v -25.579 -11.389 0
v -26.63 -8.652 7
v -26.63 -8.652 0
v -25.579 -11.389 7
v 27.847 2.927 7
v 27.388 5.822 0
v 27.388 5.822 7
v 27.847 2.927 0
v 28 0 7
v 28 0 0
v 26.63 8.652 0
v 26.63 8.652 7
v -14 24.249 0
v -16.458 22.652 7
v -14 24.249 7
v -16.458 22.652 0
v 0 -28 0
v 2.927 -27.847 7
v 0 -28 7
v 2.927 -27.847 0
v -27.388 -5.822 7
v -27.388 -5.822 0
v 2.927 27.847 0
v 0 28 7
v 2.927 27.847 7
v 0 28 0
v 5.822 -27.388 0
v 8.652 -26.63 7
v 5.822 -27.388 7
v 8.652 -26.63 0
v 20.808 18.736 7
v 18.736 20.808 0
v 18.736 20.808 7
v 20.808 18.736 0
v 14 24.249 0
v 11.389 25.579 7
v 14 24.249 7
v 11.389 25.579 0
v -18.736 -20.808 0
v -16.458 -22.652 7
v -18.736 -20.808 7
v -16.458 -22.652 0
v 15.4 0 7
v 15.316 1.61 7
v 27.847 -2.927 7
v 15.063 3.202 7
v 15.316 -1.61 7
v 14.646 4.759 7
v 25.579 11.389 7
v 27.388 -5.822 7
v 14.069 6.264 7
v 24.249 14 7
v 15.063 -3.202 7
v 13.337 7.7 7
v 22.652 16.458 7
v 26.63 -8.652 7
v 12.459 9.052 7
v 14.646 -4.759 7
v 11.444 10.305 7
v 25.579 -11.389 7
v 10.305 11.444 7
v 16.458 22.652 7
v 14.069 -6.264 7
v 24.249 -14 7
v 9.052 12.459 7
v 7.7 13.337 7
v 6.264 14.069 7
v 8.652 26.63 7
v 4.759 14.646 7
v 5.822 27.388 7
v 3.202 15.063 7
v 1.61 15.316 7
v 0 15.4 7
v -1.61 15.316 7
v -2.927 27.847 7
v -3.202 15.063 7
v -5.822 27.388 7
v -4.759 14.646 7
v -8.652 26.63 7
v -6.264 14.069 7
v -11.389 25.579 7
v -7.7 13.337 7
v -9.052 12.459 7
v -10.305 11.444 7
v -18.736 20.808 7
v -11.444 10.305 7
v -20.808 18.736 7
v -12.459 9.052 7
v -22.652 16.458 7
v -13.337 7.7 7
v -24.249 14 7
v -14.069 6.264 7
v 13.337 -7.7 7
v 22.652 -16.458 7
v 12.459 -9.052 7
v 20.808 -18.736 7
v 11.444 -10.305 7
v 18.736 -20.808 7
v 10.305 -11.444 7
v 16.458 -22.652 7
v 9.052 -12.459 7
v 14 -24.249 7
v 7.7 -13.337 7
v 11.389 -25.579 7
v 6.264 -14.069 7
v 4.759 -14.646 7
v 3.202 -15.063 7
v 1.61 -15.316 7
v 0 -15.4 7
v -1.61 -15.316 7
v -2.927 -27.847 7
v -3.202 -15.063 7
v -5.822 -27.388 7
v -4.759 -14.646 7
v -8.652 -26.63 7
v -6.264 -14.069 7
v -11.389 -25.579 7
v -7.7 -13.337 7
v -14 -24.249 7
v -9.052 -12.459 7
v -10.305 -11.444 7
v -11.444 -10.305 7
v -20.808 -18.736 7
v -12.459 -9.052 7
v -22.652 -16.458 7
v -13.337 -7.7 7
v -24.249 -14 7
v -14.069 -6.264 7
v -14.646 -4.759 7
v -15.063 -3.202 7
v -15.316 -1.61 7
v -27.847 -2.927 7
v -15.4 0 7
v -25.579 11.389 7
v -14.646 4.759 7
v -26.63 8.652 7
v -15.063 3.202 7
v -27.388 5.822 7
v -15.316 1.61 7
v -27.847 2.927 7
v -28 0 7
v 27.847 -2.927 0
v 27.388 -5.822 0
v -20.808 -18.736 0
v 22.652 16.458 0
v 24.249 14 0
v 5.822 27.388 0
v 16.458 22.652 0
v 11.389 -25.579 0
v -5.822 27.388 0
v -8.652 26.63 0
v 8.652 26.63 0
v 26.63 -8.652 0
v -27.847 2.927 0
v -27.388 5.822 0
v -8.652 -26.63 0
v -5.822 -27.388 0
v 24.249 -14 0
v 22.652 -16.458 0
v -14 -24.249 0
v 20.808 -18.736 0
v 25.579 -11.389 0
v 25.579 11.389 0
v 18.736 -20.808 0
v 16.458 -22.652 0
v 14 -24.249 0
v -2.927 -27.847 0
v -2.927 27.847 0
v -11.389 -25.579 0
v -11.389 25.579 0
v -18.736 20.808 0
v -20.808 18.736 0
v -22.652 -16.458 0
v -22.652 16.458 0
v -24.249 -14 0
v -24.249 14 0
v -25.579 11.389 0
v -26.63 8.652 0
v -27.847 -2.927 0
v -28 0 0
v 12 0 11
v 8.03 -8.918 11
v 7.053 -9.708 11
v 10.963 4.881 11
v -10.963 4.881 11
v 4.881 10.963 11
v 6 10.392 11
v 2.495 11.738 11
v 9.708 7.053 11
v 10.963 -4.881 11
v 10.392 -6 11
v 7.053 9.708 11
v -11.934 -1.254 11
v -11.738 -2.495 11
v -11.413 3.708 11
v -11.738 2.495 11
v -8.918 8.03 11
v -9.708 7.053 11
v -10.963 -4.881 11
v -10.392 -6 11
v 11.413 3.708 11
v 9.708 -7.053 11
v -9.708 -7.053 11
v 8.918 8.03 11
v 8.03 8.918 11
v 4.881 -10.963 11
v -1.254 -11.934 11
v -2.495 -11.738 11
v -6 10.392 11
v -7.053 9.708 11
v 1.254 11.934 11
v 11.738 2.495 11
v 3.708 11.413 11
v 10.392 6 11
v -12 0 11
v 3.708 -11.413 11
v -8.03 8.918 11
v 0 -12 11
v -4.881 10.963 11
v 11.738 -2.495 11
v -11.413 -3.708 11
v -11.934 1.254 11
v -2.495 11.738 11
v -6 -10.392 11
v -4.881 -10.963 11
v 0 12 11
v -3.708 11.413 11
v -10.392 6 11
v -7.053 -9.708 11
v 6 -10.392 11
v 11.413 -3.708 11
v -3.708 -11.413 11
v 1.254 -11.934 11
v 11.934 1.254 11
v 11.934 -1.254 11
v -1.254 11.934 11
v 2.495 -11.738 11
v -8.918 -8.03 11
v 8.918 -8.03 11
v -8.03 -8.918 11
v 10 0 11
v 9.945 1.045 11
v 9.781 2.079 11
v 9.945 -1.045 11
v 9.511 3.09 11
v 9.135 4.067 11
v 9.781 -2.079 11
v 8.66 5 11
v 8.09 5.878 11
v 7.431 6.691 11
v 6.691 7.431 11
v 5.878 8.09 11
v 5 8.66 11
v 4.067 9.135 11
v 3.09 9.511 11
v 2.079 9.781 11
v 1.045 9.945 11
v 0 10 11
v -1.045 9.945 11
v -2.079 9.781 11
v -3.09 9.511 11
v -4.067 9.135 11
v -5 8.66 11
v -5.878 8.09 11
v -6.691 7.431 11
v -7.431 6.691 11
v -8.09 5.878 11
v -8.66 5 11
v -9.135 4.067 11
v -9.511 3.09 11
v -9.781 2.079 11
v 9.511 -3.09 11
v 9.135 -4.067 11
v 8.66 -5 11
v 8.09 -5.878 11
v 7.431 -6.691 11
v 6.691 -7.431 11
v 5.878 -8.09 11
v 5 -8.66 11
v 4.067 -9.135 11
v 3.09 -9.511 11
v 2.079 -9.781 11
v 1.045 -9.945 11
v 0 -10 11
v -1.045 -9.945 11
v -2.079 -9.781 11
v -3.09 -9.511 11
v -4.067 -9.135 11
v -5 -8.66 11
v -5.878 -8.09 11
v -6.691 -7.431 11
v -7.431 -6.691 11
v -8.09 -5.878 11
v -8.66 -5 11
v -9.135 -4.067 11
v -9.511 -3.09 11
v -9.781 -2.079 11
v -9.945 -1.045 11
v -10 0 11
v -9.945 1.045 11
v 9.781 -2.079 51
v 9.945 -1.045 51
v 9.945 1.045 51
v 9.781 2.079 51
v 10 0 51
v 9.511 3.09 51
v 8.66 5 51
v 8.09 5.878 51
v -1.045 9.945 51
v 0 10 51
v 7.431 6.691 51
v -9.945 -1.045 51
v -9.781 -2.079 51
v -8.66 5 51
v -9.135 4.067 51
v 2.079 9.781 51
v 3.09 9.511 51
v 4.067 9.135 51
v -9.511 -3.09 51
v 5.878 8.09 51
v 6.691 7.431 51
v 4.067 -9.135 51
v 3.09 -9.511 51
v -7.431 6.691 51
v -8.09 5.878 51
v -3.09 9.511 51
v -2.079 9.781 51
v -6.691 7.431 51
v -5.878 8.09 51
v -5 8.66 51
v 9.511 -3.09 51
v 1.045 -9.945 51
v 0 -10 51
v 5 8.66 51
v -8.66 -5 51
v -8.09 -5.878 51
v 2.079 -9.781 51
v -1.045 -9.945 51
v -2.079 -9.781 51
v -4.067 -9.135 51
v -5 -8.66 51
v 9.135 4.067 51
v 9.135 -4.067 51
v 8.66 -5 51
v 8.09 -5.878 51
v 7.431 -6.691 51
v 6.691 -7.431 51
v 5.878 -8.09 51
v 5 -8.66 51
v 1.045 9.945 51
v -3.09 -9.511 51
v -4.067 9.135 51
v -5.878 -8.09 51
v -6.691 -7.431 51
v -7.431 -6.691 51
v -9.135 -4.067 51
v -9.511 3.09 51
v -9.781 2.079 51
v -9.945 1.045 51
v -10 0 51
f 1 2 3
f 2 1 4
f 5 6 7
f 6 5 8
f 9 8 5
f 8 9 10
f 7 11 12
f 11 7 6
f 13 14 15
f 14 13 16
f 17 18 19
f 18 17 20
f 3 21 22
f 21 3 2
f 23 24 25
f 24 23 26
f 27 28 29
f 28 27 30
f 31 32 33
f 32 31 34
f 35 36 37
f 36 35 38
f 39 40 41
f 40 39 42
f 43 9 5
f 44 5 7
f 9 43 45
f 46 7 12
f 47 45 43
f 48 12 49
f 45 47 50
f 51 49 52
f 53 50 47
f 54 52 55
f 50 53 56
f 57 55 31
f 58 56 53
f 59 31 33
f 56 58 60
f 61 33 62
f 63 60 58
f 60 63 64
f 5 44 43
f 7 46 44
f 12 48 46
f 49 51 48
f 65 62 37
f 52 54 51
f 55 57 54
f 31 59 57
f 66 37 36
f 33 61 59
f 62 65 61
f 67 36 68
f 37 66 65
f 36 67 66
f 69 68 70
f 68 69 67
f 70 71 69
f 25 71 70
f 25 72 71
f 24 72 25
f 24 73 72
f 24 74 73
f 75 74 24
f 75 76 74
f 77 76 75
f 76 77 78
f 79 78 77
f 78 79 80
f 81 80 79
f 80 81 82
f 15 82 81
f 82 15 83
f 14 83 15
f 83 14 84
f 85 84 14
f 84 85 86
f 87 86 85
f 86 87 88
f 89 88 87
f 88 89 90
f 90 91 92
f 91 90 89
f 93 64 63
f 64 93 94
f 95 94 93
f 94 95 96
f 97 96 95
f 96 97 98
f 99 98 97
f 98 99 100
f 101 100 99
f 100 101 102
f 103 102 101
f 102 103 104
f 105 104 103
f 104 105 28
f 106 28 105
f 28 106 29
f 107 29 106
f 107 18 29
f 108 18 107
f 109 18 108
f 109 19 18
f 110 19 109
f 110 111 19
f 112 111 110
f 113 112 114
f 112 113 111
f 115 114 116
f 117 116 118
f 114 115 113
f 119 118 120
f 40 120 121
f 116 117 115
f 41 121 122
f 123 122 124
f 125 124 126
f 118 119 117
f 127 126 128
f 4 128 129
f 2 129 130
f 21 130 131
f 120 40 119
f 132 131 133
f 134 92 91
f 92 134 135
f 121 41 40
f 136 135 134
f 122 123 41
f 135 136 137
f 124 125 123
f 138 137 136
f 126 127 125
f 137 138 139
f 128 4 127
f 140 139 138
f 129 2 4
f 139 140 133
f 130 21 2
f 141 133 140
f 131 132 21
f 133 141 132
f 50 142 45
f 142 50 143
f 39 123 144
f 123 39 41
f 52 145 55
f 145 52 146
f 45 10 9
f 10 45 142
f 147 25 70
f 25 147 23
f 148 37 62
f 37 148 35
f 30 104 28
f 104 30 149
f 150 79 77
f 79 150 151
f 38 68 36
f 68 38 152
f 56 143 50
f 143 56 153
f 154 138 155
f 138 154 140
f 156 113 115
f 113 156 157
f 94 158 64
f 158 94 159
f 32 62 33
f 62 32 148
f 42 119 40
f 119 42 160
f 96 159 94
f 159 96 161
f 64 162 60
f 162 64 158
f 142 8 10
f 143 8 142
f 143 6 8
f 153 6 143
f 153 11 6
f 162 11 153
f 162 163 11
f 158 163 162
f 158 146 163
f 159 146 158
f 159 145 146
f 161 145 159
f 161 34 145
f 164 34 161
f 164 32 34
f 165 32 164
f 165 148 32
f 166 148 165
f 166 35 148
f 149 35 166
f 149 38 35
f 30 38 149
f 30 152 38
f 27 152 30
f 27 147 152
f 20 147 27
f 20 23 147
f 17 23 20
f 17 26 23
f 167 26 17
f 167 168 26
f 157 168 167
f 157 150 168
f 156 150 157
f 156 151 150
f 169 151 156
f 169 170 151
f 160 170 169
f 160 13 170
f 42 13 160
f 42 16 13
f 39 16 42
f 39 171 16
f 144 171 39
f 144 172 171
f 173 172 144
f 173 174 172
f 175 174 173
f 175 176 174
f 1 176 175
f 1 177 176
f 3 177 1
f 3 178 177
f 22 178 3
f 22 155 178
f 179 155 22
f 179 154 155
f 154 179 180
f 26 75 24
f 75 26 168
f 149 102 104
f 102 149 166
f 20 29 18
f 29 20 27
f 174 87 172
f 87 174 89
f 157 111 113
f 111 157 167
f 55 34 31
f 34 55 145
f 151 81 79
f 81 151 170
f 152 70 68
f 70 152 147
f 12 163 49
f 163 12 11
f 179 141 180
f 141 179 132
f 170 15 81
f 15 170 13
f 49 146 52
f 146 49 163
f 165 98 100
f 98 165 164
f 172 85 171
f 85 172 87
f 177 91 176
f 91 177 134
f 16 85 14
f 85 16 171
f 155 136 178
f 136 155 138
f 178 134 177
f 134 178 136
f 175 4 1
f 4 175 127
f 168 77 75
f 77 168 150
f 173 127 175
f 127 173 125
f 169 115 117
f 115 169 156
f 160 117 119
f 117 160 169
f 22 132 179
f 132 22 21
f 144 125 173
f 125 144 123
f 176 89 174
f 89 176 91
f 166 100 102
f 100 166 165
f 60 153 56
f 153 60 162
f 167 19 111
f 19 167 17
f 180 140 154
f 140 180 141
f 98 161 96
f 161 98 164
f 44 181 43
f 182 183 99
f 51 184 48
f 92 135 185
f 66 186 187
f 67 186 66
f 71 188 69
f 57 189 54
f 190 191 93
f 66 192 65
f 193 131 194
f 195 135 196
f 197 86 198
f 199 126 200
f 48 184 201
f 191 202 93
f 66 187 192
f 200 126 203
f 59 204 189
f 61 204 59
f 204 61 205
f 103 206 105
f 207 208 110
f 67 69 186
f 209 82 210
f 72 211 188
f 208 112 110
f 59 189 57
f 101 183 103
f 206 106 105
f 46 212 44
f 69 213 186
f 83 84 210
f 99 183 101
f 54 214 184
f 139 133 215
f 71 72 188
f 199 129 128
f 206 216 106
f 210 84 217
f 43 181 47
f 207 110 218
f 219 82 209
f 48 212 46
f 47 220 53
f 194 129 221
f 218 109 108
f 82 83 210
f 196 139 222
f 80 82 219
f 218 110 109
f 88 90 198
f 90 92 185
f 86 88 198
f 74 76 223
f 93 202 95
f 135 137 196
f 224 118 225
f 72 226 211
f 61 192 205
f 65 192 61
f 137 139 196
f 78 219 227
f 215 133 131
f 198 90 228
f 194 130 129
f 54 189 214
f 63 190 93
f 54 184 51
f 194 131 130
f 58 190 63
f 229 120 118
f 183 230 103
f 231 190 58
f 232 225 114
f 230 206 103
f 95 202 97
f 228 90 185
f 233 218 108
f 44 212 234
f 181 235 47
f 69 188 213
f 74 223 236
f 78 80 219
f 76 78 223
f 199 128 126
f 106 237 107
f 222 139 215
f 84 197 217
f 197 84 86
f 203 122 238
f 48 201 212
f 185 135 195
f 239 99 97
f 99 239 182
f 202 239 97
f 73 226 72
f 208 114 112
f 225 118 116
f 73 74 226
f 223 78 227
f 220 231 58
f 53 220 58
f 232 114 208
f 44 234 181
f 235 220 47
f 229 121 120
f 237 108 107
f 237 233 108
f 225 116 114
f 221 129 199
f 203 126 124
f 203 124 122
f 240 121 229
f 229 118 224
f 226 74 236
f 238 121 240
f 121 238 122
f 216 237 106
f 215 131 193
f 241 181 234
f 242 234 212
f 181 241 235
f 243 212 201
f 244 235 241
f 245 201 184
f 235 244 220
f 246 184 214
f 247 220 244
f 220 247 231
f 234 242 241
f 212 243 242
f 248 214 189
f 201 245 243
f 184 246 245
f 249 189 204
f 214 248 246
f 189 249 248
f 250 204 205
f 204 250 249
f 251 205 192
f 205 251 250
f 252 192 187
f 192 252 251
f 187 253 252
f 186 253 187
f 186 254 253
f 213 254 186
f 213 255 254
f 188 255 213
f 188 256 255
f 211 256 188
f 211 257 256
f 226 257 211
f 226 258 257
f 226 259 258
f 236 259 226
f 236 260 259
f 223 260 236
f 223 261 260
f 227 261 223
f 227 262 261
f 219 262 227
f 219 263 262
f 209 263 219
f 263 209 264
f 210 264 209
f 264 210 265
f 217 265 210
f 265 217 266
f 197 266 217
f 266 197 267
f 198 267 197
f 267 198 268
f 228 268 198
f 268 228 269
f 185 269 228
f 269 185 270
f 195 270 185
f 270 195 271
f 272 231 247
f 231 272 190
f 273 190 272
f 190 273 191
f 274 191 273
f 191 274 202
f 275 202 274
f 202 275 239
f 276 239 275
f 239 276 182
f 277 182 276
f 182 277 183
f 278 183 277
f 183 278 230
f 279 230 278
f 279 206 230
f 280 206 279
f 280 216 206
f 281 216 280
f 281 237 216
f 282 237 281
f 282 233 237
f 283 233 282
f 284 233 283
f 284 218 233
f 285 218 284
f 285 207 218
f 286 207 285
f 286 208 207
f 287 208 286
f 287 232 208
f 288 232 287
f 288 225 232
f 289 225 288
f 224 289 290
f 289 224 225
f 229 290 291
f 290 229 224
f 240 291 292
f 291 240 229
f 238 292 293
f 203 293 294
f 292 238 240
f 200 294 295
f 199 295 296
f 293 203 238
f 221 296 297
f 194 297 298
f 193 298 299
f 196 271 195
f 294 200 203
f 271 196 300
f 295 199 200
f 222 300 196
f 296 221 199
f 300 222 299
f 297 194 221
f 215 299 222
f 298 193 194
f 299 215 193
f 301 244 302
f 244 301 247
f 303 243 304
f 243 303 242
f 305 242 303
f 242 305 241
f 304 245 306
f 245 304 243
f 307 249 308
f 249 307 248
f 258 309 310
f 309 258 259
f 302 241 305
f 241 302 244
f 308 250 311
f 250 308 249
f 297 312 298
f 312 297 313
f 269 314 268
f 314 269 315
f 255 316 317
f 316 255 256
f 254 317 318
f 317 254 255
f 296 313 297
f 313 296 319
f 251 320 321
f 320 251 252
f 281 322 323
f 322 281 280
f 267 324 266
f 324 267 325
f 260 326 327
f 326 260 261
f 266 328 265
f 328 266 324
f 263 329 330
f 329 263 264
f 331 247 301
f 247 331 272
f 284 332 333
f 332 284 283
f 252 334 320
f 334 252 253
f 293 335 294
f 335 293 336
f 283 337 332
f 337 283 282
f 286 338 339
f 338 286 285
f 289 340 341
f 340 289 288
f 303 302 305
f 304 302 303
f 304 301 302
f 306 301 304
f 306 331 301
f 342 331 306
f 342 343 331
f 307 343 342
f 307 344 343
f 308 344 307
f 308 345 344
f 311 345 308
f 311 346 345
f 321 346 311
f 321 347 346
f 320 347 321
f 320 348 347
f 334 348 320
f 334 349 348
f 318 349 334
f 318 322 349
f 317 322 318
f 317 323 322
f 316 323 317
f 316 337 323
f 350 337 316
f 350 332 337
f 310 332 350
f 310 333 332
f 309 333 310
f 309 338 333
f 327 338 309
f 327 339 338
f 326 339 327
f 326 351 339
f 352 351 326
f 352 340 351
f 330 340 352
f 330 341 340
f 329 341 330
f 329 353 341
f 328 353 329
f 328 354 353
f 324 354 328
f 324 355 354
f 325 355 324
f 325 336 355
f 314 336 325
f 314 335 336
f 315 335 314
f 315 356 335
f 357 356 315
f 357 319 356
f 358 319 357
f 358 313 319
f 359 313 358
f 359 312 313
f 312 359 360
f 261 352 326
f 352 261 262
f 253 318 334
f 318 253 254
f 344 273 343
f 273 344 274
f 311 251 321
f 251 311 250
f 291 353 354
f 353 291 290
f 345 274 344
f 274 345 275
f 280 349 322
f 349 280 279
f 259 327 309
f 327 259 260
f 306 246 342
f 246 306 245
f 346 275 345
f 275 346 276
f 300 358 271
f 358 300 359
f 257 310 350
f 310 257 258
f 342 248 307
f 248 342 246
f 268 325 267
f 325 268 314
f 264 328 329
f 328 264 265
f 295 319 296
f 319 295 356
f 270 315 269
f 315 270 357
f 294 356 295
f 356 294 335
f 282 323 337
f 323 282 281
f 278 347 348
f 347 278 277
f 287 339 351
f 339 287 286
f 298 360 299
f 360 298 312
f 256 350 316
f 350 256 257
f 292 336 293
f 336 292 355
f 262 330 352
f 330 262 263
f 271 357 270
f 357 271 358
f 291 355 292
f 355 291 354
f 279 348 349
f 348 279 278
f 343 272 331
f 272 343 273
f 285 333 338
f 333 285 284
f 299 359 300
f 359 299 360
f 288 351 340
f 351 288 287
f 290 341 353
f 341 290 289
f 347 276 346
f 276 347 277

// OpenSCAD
// Adjustable leveling foot, smooth threaded-shaft representation.
$fn = 60;
eps = 0.02;
shaft_d = 20;
pad_d = 56;
shaft_l = 40;
pad_h = 7;
union() {
    cylinder(d = pad_d, h = pad_h);
    translate([0, 0, pad_h]) cylinder(d1 = pad_d * 0.55, d2 = shaft_d + 4, h = 4);
    translate([0, 0, pad_h + 4]) cylinder(d = shaft_d, h = shaft_l);
}
